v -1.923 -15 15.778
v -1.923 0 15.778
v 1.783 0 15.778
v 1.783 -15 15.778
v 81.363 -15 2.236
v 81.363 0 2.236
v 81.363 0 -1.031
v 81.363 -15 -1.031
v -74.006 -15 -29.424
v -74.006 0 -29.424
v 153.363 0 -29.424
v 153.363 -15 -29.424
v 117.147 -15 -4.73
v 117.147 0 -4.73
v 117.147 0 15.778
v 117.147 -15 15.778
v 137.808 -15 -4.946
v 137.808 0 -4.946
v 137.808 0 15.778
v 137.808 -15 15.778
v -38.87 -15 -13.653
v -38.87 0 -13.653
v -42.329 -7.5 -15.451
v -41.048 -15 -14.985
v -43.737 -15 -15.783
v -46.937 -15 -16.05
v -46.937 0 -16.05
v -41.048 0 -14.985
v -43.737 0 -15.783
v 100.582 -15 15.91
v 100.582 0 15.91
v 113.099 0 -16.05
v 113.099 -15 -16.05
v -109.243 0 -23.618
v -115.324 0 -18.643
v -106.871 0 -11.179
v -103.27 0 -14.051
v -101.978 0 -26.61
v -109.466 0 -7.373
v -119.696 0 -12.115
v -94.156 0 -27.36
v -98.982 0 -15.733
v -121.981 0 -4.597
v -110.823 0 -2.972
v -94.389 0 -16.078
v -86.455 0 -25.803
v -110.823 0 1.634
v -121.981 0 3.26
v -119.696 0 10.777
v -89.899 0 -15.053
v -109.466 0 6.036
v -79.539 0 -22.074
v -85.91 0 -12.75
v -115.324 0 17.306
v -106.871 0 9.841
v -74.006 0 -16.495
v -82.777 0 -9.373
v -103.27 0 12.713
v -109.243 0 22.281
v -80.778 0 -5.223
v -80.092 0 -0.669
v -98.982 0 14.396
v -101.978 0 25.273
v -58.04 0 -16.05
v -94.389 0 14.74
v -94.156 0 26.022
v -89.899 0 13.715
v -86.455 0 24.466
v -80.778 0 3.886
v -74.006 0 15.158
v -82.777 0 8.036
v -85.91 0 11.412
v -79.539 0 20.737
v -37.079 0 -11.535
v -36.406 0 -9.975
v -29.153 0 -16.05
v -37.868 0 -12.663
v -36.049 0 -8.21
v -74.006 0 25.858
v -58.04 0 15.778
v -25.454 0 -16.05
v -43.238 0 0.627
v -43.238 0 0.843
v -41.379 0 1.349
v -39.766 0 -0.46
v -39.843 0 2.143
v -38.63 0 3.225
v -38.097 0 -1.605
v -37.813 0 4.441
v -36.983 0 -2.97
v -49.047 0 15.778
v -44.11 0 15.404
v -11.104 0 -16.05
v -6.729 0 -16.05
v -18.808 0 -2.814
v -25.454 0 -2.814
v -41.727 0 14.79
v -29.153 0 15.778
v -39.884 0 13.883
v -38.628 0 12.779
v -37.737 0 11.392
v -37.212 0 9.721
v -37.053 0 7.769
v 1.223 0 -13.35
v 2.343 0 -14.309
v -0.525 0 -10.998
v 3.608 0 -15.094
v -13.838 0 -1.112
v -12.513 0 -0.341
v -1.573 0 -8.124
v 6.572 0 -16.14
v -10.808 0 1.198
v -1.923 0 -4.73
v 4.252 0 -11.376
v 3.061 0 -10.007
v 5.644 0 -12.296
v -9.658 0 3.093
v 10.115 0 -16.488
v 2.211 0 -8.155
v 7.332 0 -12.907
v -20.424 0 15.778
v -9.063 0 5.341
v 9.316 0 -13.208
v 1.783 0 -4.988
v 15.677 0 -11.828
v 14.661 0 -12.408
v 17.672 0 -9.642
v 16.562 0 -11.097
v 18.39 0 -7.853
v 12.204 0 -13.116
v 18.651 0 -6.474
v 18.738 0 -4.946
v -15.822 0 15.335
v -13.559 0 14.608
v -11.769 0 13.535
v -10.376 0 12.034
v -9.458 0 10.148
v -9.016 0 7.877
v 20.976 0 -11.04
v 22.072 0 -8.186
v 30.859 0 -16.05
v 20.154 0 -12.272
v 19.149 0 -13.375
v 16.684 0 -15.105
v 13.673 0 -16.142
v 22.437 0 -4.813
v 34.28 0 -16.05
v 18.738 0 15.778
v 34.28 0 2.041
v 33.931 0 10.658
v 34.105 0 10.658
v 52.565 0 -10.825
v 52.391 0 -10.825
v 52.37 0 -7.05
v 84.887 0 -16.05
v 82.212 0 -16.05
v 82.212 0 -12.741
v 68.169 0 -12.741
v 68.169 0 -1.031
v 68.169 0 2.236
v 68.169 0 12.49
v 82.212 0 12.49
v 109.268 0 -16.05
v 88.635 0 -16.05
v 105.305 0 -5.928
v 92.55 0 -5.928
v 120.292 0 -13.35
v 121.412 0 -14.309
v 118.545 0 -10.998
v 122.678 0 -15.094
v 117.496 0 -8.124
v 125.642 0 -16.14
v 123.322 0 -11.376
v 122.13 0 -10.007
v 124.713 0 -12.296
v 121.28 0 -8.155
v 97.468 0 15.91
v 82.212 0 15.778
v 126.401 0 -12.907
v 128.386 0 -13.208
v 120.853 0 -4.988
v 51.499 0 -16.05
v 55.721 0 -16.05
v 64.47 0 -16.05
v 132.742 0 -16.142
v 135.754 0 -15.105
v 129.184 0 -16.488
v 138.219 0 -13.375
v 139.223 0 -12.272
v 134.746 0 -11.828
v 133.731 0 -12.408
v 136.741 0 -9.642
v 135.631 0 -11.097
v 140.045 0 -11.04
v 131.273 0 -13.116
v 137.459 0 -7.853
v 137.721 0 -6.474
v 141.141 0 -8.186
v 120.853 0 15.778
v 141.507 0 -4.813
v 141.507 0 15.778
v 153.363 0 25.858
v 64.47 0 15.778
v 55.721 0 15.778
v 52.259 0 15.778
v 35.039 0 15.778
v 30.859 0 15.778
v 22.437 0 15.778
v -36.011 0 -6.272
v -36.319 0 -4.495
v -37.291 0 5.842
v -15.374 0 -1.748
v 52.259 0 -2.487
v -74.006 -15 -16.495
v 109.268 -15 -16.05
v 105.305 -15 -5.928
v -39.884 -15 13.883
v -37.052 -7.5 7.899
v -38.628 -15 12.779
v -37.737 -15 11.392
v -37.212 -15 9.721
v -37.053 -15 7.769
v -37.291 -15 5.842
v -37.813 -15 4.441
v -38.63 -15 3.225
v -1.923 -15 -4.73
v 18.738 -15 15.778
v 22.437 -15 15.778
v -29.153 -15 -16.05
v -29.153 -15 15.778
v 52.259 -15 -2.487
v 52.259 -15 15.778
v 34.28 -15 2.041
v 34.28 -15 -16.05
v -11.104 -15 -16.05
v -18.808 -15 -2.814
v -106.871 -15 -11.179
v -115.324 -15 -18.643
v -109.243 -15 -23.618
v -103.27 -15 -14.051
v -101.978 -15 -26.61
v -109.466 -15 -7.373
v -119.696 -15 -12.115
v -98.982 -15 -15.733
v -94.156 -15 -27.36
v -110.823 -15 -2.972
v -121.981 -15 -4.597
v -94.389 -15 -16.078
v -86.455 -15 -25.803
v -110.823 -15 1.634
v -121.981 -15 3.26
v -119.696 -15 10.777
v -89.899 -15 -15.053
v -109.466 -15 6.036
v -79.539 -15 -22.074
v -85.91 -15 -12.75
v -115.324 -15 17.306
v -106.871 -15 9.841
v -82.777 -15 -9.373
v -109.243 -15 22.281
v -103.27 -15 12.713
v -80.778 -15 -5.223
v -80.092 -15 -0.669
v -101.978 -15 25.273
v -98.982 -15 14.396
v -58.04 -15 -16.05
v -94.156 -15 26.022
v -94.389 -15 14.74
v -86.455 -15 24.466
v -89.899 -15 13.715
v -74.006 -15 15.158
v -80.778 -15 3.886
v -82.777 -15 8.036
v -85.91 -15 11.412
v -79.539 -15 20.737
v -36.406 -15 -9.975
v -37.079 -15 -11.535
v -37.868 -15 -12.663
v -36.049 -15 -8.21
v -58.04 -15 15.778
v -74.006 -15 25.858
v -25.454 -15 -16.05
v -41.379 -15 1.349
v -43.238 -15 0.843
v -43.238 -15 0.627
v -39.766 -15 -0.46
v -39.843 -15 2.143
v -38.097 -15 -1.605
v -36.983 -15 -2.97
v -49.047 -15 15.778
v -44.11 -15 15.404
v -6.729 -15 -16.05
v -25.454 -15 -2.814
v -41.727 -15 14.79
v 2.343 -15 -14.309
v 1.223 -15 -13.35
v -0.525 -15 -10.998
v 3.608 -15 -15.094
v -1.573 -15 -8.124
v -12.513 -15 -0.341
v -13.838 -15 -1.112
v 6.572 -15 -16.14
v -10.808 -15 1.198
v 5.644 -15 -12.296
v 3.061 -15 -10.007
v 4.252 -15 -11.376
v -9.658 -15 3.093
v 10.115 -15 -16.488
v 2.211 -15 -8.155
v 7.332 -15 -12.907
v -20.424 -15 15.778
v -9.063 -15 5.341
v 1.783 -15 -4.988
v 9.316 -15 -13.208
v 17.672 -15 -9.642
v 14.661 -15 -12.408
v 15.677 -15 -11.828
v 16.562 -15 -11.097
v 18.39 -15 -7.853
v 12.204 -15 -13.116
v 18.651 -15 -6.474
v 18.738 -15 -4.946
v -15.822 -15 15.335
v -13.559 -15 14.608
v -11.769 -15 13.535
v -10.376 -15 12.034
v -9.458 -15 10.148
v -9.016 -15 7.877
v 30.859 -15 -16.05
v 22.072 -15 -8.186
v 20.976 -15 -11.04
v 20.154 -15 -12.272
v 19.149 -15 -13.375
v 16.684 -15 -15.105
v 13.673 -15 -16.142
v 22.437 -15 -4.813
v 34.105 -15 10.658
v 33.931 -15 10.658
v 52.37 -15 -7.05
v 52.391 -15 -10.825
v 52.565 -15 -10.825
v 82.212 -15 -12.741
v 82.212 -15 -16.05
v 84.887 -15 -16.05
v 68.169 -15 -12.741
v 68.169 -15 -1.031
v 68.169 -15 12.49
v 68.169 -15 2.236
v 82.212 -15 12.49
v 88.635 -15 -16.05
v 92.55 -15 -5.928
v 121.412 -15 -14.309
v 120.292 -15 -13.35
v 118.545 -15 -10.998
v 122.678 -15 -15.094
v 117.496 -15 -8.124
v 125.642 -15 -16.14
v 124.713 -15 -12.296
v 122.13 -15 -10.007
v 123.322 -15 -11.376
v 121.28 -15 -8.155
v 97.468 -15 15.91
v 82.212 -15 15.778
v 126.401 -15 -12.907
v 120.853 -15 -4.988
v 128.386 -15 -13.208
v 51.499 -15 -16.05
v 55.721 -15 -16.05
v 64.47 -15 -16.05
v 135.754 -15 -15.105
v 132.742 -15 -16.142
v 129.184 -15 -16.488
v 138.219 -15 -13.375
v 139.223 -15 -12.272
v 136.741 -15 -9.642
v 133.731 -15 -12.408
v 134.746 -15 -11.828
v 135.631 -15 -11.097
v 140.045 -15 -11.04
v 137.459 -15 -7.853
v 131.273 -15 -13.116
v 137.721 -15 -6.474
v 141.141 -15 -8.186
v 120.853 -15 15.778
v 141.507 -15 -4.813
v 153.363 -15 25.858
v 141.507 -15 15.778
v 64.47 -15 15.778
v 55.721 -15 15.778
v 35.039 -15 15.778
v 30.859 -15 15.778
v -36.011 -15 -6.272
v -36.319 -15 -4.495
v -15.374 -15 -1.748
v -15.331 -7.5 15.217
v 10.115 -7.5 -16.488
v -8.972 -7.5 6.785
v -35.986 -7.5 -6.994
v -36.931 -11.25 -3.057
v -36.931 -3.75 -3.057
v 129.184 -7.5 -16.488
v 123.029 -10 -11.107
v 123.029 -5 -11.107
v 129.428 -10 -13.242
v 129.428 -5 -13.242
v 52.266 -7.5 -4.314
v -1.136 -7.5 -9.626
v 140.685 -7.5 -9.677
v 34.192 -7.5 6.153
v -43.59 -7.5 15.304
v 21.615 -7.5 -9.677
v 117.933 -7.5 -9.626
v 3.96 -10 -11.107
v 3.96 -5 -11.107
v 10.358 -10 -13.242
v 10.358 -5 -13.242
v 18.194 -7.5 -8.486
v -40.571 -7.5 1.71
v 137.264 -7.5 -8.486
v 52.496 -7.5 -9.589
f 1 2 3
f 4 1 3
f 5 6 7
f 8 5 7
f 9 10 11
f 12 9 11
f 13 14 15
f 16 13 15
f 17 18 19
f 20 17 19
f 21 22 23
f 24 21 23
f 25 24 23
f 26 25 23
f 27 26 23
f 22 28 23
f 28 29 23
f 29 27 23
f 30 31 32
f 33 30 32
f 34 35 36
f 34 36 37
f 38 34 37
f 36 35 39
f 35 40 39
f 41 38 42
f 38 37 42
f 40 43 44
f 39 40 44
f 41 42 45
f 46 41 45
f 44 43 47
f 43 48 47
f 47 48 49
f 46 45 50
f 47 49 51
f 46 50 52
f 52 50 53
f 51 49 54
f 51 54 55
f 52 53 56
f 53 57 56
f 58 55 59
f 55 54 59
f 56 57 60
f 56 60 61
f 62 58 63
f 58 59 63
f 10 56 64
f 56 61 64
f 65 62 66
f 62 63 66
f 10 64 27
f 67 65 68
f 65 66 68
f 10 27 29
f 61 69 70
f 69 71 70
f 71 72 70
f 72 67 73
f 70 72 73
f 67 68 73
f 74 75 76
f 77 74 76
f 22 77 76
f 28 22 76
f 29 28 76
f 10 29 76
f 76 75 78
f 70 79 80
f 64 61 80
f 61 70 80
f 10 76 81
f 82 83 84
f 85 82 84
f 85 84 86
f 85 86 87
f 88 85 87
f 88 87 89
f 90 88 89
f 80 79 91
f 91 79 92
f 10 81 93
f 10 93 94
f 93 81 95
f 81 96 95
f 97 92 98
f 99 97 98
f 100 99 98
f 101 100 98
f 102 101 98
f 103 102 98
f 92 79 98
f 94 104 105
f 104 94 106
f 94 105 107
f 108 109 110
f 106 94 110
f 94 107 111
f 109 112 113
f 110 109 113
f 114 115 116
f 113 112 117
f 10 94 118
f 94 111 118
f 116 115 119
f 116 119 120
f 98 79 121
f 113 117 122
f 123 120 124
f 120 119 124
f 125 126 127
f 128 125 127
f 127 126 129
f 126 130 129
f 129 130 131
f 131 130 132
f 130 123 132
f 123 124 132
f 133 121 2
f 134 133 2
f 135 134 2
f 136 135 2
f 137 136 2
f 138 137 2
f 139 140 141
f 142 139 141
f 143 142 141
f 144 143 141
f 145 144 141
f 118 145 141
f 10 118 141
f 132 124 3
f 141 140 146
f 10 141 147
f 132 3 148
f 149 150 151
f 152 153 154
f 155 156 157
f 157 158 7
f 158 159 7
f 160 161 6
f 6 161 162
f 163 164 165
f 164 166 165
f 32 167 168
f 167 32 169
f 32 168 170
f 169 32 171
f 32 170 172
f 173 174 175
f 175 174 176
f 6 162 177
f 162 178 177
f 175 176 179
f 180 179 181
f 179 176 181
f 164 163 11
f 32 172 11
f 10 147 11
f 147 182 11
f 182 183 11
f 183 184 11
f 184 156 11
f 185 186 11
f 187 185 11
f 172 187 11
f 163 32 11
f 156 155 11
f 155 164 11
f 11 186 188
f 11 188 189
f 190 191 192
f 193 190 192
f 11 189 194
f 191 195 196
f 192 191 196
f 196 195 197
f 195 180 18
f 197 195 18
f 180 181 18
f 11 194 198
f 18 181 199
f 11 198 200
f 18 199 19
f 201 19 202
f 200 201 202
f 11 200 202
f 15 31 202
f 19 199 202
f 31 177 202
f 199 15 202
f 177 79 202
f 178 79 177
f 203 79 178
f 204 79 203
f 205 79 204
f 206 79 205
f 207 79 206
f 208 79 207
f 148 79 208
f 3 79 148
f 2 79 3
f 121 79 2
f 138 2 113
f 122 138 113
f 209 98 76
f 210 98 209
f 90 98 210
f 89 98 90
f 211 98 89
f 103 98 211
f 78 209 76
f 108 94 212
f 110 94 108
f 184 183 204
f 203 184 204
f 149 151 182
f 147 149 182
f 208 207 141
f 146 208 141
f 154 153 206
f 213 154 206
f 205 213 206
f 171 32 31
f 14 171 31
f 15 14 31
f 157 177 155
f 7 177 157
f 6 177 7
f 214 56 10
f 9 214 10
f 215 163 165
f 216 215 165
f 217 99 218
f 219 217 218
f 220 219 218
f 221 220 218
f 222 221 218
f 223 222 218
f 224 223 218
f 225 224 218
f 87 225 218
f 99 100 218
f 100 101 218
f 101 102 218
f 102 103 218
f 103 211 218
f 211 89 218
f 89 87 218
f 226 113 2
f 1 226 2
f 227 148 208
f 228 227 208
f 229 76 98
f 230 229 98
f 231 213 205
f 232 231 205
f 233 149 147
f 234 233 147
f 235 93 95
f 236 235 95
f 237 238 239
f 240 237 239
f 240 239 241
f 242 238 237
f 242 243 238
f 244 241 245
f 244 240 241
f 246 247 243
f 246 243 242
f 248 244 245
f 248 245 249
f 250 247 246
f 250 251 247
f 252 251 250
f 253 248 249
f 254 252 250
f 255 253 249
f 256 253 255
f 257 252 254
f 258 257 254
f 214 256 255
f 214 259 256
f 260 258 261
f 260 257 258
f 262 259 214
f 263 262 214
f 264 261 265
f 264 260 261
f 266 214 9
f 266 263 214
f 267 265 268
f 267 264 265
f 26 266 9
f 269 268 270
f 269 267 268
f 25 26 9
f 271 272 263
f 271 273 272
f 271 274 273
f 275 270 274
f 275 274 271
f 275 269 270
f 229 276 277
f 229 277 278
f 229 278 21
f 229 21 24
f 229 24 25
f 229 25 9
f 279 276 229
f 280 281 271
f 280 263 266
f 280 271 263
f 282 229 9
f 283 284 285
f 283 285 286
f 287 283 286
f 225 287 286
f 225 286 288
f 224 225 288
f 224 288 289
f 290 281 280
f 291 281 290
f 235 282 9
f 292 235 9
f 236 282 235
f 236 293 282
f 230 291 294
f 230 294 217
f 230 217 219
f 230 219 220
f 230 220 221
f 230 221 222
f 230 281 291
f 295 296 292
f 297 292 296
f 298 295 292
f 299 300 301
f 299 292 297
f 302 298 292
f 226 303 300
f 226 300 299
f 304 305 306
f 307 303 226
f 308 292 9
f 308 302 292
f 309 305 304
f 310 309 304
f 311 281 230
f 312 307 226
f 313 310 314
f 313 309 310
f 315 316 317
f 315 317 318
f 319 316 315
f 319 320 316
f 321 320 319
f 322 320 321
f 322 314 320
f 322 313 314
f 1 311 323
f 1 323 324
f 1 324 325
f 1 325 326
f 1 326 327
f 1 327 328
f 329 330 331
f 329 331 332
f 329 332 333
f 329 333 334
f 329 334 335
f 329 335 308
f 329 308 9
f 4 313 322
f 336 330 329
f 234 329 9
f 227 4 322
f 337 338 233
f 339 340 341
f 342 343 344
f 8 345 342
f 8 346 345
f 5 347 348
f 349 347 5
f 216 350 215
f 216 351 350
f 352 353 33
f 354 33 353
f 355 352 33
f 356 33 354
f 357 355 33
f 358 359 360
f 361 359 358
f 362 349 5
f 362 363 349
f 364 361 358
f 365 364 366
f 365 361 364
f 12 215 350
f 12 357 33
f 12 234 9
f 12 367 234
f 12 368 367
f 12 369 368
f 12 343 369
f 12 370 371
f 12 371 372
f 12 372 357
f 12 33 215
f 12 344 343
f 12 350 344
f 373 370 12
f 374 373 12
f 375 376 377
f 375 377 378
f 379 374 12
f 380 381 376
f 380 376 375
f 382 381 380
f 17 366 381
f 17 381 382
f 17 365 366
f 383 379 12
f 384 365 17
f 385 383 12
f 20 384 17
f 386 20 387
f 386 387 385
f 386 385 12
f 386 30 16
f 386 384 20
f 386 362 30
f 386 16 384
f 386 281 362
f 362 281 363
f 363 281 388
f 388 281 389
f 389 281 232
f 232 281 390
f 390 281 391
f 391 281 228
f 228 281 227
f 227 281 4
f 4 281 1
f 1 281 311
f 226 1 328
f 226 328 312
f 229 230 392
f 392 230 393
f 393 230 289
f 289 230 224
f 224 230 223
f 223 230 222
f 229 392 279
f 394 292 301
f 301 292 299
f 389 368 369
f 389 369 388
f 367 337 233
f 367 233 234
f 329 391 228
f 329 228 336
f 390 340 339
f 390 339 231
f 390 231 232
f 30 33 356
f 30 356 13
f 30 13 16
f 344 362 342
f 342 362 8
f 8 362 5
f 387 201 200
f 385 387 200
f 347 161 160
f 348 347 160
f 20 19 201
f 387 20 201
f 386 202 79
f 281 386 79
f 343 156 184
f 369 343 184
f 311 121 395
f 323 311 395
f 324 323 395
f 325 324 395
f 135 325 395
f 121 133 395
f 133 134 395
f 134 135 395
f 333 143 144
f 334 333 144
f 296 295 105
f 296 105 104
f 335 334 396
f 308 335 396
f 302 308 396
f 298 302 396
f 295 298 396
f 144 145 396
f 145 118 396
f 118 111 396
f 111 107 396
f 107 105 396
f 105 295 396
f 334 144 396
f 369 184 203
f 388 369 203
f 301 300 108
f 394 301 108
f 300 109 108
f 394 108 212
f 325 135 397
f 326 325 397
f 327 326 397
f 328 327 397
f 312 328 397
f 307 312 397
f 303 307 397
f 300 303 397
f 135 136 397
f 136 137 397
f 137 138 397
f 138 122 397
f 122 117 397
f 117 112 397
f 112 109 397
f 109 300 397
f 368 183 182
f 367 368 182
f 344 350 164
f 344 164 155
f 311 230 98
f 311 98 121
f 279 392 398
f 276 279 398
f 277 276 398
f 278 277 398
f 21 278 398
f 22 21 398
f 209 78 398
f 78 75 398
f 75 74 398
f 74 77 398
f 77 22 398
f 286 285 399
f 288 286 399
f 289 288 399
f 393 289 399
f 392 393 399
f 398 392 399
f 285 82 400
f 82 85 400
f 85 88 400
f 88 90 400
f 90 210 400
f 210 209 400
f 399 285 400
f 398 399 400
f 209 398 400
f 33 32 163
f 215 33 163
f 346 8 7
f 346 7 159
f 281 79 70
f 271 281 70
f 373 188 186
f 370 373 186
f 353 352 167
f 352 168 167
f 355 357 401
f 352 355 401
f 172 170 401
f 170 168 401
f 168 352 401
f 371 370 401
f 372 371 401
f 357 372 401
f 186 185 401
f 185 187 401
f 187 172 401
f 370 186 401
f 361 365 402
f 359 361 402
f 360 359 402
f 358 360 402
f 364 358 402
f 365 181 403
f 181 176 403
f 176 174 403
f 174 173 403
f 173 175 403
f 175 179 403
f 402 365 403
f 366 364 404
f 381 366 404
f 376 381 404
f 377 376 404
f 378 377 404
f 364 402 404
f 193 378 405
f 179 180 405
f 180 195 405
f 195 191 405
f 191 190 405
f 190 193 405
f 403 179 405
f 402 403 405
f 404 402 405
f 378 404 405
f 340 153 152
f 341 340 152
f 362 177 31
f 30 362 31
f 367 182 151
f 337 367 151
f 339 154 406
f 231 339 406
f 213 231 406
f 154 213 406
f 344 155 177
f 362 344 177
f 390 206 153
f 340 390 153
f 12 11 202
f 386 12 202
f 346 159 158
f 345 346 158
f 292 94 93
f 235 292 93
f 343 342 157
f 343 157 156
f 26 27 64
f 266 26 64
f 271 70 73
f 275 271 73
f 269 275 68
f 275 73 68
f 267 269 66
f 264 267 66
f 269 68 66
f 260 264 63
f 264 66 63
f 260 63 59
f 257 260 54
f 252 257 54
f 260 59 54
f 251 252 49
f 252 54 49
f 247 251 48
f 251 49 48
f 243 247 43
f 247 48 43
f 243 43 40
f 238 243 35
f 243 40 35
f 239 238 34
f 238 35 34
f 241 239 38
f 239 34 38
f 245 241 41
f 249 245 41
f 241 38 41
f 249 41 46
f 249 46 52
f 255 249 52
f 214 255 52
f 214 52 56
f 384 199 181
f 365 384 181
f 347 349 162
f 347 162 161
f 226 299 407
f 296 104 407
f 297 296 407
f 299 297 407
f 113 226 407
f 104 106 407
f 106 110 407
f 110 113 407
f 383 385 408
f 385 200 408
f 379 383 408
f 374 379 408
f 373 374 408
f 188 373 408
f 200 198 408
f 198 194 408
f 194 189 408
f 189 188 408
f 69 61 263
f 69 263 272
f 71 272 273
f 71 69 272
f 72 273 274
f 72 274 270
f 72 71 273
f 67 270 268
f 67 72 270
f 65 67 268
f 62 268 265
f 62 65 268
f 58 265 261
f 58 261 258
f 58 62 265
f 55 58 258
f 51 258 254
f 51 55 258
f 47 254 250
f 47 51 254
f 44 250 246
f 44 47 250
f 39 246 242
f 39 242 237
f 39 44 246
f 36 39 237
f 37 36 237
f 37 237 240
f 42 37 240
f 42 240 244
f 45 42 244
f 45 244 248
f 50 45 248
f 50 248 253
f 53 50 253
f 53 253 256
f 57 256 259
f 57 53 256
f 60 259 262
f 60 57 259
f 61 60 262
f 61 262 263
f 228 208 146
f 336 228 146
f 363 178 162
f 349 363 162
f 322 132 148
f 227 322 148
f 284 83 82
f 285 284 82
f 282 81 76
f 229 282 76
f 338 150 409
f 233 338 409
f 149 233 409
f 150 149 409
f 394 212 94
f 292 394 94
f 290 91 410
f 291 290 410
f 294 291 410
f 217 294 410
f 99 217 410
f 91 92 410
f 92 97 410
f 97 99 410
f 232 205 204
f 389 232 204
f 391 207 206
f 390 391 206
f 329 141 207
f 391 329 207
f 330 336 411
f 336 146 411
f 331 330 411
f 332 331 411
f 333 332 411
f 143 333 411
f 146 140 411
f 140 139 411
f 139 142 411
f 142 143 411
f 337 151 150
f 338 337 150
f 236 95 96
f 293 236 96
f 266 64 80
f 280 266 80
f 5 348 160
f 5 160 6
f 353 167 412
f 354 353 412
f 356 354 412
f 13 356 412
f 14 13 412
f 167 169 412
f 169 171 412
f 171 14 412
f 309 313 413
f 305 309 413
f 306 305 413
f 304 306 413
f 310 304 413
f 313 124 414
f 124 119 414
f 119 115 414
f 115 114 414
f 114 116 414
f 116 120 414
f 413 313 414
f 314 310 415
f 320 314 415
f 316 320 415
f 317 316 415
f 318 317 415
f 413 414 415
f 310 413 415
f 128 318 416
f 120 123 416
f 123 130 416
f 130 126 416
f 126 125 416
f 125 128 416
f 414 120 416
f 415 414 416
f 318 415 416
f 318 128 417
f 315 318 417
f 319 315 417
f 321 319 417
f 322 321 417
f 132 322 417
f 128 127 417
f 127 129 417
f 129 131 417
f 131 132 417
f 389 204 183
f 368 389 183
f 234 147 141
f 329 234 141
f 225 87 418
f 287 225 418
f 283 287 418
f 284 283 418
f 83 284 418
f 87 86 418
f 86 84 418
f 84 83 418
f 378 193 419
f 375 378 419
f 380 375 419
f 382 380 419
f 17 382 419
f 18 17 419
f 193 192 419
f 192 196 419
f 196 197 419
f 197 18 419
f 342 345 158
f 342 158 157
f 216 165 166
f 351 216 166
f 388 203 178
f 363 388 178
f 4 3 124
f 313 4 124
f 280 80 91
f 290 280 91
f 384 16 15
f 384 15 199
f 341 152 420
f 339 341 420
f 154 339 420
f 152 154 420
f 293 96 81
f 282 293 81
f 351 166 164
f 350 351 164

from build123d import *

# Parameters (mm, degrees)
F0_R     = 15.4520785229
F1_DEPTH = 15


with BuildPart() as f1:
    # F0 (on Front) → F1 (new body)
    with BuildSketch(Plane.XZ):
        with BuildLine():
            Line((153.3627957106, 25.8576832712), (-74.0064680576, 25.8576832712))
            Line((-74.0064680576, 25.8576832712), (-74.0064680576, 15.1579529047))
            ThreePointArc((-74.0064680576, 15.1579529047), (-122.2711699364, -0.6687305868), (-74.0064680576, -16.4954140782))
            Line((-74.0064680576, -16.4954140782), (-74.0064680576, -29.4242557138))
            Line((-74.0064680576, -29.4242557138), (153.3627957106, -29.4242557138))
            Line((153.3627957106, -29.4242557138), (153.3627957106, 25.8576832712))
        make_face()
        with Locations((-95.5439214778, -0.6687305868)):
            Circle(F0_R, mode=Mode.SUBTRACT)
        with BuildLine():
            Line((-58.040468074, -16.0495918244), (-58.040468074, 15.7779227399))
            Line((-58.040468074, 15.7779227399), (-49.0474014724, 15.7779227399))
            add(Edge.make_bspline(
                [(-49.0474014724, 15.7779227399), (-42.7153352131, 15.7779227399), (-39.8836686185, 13.8831790407)],
                knots=[0, 0, 0, 1, 1, 1], degree=2))
            add(Edge.make_bspline(
                [(-39.8836686185, 13.8831790407), (-37.052002024, 11.9884353416), (-37.052002024, 7.8994112555)],
                knots=[0, 0, 0, 1, 1, 1], degree=2))
            add(Edge.make_bspline(
                [(-37.052002024, 7.8994112555), (-37.052002024, 5.0642616762), (-38.6297941117, 3.2252457329)],
                knots=[0, 0, 0, 1, 1, 1], degree=2))
            add(Edge.make_bspline(
                [(-38.6297941117, 3.2252457329), (-40.2075861995, 1.3862297896), (-43.2377829242, 0.84288417)],
                knots=[0, 0, 0, 1, 1, 1], degree=2))
            Line((-43.2377829242, 0.84288417), (-43.2377829242, 0.626939116))
            add(Edge.make_bspline(
                [(-43.2377829242, 0.626939116), (-35.9862086932, -0.6130034518), (-35.9862086932, -6.9938314975)],
                knots=[0, 0, 0, 1, 1, 1], degree=2))
            add(Edge.make_bspline(
                [(-35.9862086932, -6.9938314975), (-35.9862086932, -11.2570048206), (-38.8701200589, -13.6532983225)],
                knots=[0, 0, 0, 1, 1, 1], degree=2))
            add(Edge.make_bspline(
                [(-38.8701200589, -13.6532983225), (-41.7540314245, -16.0495918244), (-46.9367127193, -16.0495918244)],
                knots=[0, 0, 0, 1, 1, 1], degree=2))
            Line((-46.9367127193, -16.0495918244), (-58.040468074, -16.0495918244))
        make_face(mode=Mode.SUBTRACT)
        with BuildLine():
            Line((-18.80812795, -2.8142498082), (-25.4536628361, -2.8142498082))
            Line((-25.4536628361, -2.8142498082), (-25.4536628361, -16.0495918244))
            Line((-25.4536628361, -16.0495918244), (-29.1525926312, -16.0495918244))
            Line((-29.1525926312, -16.0495918244), (-29.1525926312, 15.7779227399))
            Line((-29.1525926312, 15.7779227399), (-20.4242328699, 15.7779227399))
            add(Edge.make_bspline(
                [(-20.4242328699, 15.7779227399), (-14.5658525354, 15.7779227399), (-11.7690157883, 13.5348805666)],
                knots=[0, 0, 0, 1, 1, 1], degree=2))
            add(Edge.make_bspline(
                [(-11.7690157883, 13.5348805666), (-8.9721790411, 11.2918383933), (-8.9721790411, 6.7848561383)],
                knots=[0, 0, 0, 1, 1, 1], degree=2))
            add(Edge.make_bspline(
                [(-8.9721790411, 6.7848561383), (-8.9721790411, 0.4736877874), (-15.3739049953, -1.7484564774)],
                knots=[0, 0, 0, 1, 1, 1], degree=2))
            Line((-15.3739049953, -1.7484564774), (-6.7291368679, -16.0495918244))
            Line((-6.7291368679, -16.0495918244), (-11.1037657027, -16.0495918244))
            Line((-11.1037657027, -16.0495918244), (-18.80812795, -2.8142498082))
        make_face(mode=Mode.SUBTRACT)
        with BuildLine():
            Line((18.7384475592, 15.7779227399), (22.4373773542, 15.7779227399))
            Line((22.4373773542, 15.7779227399), (22.4373773542, -4.8134830496))
            add(Edge.make_bspline(
                [(22.4373773542, -4.8134830496), (22.4373773542, -10.2608711847), (19.1494397586, -13.3746595432)],
                knots=[0, 0, 0, 1, 1, 1], degree=2))
            add(Edge.make_bspline(
                [(19.1494397586, -13.3746595432), (15.861502163, -16.4884479018), (10.1145773402, -16.4884479018)],
                knots=[0, 0, 0, 1, 1, 1], degree=2))
            add(Edge.make_bspline(
                [(10.1145773402, -16.4884479018), (4.3676525173, -16.4884479018), (1.2225172961, -13.35027865)],
                knots=[0, 0, 0, 1, 1, 1], degree=2))
            add(Edge.make_bspline(
                [(1.2225172961, -13.35027865), (-1.9226179251, -10.2121093983), (-1.9226179251, -4.7298914158)],
                knots=[0, 0, 0, 1, 1, 1], degree=2))
            Line((-1.9226179251, -4.7298914158), (-1.9226179251, 15.7779227399))
            Line((-1.9226179251, 15.7779227399), (1.7832778394, 15.7779227399))
            Line((1.7832778394, 15.7779227399), (1.7832778394, -4.9876322866))
            add(Edge.make_bspline(
                [(1.7832778394, -4.9876322866), (1.7832778394, -8.9721668305), (3.9601433026, -11.1072364768)],
                knots=[0, 0, 0, 1, 1, 1], degree=2))
            add(Edge.make_bspline(
                [(3.9601433026, -11.1072364768), (6.1370087658, -13.2423061231), (10.358386272, -13.2423061231)],
                knots=[0, 0, 0, 1, 1, 1], degree=2))
            add(Edge.make_bspline(
                [(10.358386272, -13.2423061231), (14.3847166328, -13.2423061231), (16.561582096, -11.0967875225)],
                knots=[0, 0, 0, 1, 1, 1], degree=2))
            add(Edge.make_bspline(
                [(16.561582096, -11.0967875225), (18.7384475592, -8.951268922), (18.7384475592, -4.9458364697)],
                knots=[0, 0, 0, 1, 1, 1], degree=2))
            Line((18.7384475592, -4.9458364697), (18.7384475592, 15.7779227399))
        make_face(mode=Mode.SUBTRACT)
        with BuildLine():
            Line((55.7207795403, 15.7779227399), (55.7207795403, -16.0495918244))
            Line((55.7207795403, -16.0495918244), (51.4994020341, -16.0495918244))
            Line((51.4994020341, -16.0495918244), (34.105376237, 10.6579351705))
            Line((34.105376237, 10.6579351705), (33.9312269999, 10.6579351705))
            add(Edge.make_bspline(
                [(33.9312269999, 10.6579351705), (34.279525474, 5.95590577), (34.279525474, 2.0410309209)],
                knots=[0, 0, 0, 1, 1, 1], degree=2))
            Line((34.279525474, 2.0410309209), (34.279525474, -16.0495918244))
            Line((34.279525474, -16.0495918244), (30.8592344582, -16.0495918244))
            Line((30.8592344582, -16.0495918244), (30.8592344582, 15.7779227399))
            Line((30.8592344582, 15.7779227399), (35.0388161476, 15.7779227399))
            Line((35.0388161476, 15.7779227399), (52.3910461278, -10.8251147127))
            Line((52.3910461278, -10.8251147127), (52.5651953649, -10.8251147127))
            add(Edge.make_bspline(
                [(52.5651953649, -10.8251147127), (52.523399548, -10.2399732762), (52.3701482194, -7.0495592534)],
                knots=[0, 0, 0, 1, 1, 1], degree=2))
            add(Edge.make_bspline(
                [(52.3701482194, -7.0495592534), (52.2168968908, -3.8591452305), (52.2586927077, -2.4868492425)],
                knots=[0, 0, 0, 1, 1, 1], degree=2))
            Line((52.2586927077, -2.4868492425), (52.2586927077, 15.7779227399))
            Line((52.2586927077, 15.7779227399), (55.7207795403, 15.7779227399))
        make_face(mode=Mode.SUBTRACT)
        Polygon((82.2123614812, -12.7407563204), (82.2123614812, -16.0495918244), (64.47003721, -16.0495918244), (64.47003721, 15.7779227399), (82.2123614812, 15.7779227399), (82.2123614812, 12.4899851443), (68.1689670051, 12.4899851443), (68.1689670051, 2.2360780664), (81.3625132044, 2.2360780664), (81.3625132044, -1.0309616207), (68.1689670051, -1.0309616207), (68.1689670051, -12.7407563204), align=None, mode=Mode.SUBTRACT)
        Polygon((113.0994701655, -16.0495918244), (109.2681869502, -16.0495918244), (105.3045503148, -5.9280381667), (92.5498601929, -5.9280381667), (88.6349853439, -16.0495918244), (84.8872937624, -16.0495918244), (97.4678346473, 15.9102761601), (100.5816230059, 15.9102761601), align=None, mode=Mode.SUBTRACT)
        with BuildLine():
            Line((137.8077639189, 15.7779227399), (141.506693714, 15.7779227399))
            Line((141.506693714, 15.7779227399), (141.506693714, -4.8134830496))
            add(Edge.make_bspline(
                [(141.506693714, -4.8134830496), (141.506693714, -10.2608711847), (138.2187561184, -13.3746595432)],
                knots=[0, 0, 0, 1, 1, 1], degree=2))
            add(Edge.make_bspline(
                [(138.2187561184, -13.3746595432), (134.9308185228, -16.4884479018), (129.1838936999, -16.4884479018)],
                knots=[0, 0, 0, 1, 1, 1], degree=2))
            add(Edge.make_bspline(
                [(129.1838936999, -16.4884479018), (123.4369688771, -16.4884479018), (120.2918336559, -13.35027865)],
                knots=[0, 0, 0, 1, 1, 1], degree=2))
            add(Edge.make_bspline(
                [(120.2918336559, -13.35027865), (117.1466984346, -10.2121093983), (117.1466984346, -4.7298914158)],
                knots=[0, 0, 0, 1, 1, 1], degree=2))
            Line((117.1466984346, -4.7298914158), (117.1466984346, 15.7779227399))
            Line((117.1466984346, 15.7779227399), (120.8525941992, 15.7779227399))
            Line((120.8525941992, 15.7779227399), (120.8525941992, -4.9876322866))
            add(Edge.make_bspline(
                [(120.8525941992, -4.9876322866), (120.8525941992, -8.9721668305), (123.0294596624, -11.1072364768)],
                knots=[0, 0, 0, 1, 1, 1], degree=2))
            add(Edge.make_bspline(
                [(123.0294596624, -11.1072364768), (125.2063251256, -13.2423061231), (129.4277026318, -13.2423061231)],
                knots=[0, 0, 0, 1, 1, 1], degree=2))
            add(Edge.make_bspline(
                [(129.4277026318, -13.2423061231), (133.4540329925, -13.2423061231), (135.6308984557, -11.0967875225)],
                knots=[0, 0, 0, 1, 1, 1], degree=2))
            add(Edge.make_bspline(
                [(135.6308984557, -11.0967875225), (137.8077639189, -8.951268922), (137.8077639189, -4.9458364697)],
                knots=[0, 0, 0, 1, 1, 1], degree=2))
            Line((137.8077639189, -4.9458364697), (137.8077639189, 15.7779227399))
        make_face(mode=Mode.SUBTRACT)
    extrude(amount=F1_DEPTH)


solid = f1.part
